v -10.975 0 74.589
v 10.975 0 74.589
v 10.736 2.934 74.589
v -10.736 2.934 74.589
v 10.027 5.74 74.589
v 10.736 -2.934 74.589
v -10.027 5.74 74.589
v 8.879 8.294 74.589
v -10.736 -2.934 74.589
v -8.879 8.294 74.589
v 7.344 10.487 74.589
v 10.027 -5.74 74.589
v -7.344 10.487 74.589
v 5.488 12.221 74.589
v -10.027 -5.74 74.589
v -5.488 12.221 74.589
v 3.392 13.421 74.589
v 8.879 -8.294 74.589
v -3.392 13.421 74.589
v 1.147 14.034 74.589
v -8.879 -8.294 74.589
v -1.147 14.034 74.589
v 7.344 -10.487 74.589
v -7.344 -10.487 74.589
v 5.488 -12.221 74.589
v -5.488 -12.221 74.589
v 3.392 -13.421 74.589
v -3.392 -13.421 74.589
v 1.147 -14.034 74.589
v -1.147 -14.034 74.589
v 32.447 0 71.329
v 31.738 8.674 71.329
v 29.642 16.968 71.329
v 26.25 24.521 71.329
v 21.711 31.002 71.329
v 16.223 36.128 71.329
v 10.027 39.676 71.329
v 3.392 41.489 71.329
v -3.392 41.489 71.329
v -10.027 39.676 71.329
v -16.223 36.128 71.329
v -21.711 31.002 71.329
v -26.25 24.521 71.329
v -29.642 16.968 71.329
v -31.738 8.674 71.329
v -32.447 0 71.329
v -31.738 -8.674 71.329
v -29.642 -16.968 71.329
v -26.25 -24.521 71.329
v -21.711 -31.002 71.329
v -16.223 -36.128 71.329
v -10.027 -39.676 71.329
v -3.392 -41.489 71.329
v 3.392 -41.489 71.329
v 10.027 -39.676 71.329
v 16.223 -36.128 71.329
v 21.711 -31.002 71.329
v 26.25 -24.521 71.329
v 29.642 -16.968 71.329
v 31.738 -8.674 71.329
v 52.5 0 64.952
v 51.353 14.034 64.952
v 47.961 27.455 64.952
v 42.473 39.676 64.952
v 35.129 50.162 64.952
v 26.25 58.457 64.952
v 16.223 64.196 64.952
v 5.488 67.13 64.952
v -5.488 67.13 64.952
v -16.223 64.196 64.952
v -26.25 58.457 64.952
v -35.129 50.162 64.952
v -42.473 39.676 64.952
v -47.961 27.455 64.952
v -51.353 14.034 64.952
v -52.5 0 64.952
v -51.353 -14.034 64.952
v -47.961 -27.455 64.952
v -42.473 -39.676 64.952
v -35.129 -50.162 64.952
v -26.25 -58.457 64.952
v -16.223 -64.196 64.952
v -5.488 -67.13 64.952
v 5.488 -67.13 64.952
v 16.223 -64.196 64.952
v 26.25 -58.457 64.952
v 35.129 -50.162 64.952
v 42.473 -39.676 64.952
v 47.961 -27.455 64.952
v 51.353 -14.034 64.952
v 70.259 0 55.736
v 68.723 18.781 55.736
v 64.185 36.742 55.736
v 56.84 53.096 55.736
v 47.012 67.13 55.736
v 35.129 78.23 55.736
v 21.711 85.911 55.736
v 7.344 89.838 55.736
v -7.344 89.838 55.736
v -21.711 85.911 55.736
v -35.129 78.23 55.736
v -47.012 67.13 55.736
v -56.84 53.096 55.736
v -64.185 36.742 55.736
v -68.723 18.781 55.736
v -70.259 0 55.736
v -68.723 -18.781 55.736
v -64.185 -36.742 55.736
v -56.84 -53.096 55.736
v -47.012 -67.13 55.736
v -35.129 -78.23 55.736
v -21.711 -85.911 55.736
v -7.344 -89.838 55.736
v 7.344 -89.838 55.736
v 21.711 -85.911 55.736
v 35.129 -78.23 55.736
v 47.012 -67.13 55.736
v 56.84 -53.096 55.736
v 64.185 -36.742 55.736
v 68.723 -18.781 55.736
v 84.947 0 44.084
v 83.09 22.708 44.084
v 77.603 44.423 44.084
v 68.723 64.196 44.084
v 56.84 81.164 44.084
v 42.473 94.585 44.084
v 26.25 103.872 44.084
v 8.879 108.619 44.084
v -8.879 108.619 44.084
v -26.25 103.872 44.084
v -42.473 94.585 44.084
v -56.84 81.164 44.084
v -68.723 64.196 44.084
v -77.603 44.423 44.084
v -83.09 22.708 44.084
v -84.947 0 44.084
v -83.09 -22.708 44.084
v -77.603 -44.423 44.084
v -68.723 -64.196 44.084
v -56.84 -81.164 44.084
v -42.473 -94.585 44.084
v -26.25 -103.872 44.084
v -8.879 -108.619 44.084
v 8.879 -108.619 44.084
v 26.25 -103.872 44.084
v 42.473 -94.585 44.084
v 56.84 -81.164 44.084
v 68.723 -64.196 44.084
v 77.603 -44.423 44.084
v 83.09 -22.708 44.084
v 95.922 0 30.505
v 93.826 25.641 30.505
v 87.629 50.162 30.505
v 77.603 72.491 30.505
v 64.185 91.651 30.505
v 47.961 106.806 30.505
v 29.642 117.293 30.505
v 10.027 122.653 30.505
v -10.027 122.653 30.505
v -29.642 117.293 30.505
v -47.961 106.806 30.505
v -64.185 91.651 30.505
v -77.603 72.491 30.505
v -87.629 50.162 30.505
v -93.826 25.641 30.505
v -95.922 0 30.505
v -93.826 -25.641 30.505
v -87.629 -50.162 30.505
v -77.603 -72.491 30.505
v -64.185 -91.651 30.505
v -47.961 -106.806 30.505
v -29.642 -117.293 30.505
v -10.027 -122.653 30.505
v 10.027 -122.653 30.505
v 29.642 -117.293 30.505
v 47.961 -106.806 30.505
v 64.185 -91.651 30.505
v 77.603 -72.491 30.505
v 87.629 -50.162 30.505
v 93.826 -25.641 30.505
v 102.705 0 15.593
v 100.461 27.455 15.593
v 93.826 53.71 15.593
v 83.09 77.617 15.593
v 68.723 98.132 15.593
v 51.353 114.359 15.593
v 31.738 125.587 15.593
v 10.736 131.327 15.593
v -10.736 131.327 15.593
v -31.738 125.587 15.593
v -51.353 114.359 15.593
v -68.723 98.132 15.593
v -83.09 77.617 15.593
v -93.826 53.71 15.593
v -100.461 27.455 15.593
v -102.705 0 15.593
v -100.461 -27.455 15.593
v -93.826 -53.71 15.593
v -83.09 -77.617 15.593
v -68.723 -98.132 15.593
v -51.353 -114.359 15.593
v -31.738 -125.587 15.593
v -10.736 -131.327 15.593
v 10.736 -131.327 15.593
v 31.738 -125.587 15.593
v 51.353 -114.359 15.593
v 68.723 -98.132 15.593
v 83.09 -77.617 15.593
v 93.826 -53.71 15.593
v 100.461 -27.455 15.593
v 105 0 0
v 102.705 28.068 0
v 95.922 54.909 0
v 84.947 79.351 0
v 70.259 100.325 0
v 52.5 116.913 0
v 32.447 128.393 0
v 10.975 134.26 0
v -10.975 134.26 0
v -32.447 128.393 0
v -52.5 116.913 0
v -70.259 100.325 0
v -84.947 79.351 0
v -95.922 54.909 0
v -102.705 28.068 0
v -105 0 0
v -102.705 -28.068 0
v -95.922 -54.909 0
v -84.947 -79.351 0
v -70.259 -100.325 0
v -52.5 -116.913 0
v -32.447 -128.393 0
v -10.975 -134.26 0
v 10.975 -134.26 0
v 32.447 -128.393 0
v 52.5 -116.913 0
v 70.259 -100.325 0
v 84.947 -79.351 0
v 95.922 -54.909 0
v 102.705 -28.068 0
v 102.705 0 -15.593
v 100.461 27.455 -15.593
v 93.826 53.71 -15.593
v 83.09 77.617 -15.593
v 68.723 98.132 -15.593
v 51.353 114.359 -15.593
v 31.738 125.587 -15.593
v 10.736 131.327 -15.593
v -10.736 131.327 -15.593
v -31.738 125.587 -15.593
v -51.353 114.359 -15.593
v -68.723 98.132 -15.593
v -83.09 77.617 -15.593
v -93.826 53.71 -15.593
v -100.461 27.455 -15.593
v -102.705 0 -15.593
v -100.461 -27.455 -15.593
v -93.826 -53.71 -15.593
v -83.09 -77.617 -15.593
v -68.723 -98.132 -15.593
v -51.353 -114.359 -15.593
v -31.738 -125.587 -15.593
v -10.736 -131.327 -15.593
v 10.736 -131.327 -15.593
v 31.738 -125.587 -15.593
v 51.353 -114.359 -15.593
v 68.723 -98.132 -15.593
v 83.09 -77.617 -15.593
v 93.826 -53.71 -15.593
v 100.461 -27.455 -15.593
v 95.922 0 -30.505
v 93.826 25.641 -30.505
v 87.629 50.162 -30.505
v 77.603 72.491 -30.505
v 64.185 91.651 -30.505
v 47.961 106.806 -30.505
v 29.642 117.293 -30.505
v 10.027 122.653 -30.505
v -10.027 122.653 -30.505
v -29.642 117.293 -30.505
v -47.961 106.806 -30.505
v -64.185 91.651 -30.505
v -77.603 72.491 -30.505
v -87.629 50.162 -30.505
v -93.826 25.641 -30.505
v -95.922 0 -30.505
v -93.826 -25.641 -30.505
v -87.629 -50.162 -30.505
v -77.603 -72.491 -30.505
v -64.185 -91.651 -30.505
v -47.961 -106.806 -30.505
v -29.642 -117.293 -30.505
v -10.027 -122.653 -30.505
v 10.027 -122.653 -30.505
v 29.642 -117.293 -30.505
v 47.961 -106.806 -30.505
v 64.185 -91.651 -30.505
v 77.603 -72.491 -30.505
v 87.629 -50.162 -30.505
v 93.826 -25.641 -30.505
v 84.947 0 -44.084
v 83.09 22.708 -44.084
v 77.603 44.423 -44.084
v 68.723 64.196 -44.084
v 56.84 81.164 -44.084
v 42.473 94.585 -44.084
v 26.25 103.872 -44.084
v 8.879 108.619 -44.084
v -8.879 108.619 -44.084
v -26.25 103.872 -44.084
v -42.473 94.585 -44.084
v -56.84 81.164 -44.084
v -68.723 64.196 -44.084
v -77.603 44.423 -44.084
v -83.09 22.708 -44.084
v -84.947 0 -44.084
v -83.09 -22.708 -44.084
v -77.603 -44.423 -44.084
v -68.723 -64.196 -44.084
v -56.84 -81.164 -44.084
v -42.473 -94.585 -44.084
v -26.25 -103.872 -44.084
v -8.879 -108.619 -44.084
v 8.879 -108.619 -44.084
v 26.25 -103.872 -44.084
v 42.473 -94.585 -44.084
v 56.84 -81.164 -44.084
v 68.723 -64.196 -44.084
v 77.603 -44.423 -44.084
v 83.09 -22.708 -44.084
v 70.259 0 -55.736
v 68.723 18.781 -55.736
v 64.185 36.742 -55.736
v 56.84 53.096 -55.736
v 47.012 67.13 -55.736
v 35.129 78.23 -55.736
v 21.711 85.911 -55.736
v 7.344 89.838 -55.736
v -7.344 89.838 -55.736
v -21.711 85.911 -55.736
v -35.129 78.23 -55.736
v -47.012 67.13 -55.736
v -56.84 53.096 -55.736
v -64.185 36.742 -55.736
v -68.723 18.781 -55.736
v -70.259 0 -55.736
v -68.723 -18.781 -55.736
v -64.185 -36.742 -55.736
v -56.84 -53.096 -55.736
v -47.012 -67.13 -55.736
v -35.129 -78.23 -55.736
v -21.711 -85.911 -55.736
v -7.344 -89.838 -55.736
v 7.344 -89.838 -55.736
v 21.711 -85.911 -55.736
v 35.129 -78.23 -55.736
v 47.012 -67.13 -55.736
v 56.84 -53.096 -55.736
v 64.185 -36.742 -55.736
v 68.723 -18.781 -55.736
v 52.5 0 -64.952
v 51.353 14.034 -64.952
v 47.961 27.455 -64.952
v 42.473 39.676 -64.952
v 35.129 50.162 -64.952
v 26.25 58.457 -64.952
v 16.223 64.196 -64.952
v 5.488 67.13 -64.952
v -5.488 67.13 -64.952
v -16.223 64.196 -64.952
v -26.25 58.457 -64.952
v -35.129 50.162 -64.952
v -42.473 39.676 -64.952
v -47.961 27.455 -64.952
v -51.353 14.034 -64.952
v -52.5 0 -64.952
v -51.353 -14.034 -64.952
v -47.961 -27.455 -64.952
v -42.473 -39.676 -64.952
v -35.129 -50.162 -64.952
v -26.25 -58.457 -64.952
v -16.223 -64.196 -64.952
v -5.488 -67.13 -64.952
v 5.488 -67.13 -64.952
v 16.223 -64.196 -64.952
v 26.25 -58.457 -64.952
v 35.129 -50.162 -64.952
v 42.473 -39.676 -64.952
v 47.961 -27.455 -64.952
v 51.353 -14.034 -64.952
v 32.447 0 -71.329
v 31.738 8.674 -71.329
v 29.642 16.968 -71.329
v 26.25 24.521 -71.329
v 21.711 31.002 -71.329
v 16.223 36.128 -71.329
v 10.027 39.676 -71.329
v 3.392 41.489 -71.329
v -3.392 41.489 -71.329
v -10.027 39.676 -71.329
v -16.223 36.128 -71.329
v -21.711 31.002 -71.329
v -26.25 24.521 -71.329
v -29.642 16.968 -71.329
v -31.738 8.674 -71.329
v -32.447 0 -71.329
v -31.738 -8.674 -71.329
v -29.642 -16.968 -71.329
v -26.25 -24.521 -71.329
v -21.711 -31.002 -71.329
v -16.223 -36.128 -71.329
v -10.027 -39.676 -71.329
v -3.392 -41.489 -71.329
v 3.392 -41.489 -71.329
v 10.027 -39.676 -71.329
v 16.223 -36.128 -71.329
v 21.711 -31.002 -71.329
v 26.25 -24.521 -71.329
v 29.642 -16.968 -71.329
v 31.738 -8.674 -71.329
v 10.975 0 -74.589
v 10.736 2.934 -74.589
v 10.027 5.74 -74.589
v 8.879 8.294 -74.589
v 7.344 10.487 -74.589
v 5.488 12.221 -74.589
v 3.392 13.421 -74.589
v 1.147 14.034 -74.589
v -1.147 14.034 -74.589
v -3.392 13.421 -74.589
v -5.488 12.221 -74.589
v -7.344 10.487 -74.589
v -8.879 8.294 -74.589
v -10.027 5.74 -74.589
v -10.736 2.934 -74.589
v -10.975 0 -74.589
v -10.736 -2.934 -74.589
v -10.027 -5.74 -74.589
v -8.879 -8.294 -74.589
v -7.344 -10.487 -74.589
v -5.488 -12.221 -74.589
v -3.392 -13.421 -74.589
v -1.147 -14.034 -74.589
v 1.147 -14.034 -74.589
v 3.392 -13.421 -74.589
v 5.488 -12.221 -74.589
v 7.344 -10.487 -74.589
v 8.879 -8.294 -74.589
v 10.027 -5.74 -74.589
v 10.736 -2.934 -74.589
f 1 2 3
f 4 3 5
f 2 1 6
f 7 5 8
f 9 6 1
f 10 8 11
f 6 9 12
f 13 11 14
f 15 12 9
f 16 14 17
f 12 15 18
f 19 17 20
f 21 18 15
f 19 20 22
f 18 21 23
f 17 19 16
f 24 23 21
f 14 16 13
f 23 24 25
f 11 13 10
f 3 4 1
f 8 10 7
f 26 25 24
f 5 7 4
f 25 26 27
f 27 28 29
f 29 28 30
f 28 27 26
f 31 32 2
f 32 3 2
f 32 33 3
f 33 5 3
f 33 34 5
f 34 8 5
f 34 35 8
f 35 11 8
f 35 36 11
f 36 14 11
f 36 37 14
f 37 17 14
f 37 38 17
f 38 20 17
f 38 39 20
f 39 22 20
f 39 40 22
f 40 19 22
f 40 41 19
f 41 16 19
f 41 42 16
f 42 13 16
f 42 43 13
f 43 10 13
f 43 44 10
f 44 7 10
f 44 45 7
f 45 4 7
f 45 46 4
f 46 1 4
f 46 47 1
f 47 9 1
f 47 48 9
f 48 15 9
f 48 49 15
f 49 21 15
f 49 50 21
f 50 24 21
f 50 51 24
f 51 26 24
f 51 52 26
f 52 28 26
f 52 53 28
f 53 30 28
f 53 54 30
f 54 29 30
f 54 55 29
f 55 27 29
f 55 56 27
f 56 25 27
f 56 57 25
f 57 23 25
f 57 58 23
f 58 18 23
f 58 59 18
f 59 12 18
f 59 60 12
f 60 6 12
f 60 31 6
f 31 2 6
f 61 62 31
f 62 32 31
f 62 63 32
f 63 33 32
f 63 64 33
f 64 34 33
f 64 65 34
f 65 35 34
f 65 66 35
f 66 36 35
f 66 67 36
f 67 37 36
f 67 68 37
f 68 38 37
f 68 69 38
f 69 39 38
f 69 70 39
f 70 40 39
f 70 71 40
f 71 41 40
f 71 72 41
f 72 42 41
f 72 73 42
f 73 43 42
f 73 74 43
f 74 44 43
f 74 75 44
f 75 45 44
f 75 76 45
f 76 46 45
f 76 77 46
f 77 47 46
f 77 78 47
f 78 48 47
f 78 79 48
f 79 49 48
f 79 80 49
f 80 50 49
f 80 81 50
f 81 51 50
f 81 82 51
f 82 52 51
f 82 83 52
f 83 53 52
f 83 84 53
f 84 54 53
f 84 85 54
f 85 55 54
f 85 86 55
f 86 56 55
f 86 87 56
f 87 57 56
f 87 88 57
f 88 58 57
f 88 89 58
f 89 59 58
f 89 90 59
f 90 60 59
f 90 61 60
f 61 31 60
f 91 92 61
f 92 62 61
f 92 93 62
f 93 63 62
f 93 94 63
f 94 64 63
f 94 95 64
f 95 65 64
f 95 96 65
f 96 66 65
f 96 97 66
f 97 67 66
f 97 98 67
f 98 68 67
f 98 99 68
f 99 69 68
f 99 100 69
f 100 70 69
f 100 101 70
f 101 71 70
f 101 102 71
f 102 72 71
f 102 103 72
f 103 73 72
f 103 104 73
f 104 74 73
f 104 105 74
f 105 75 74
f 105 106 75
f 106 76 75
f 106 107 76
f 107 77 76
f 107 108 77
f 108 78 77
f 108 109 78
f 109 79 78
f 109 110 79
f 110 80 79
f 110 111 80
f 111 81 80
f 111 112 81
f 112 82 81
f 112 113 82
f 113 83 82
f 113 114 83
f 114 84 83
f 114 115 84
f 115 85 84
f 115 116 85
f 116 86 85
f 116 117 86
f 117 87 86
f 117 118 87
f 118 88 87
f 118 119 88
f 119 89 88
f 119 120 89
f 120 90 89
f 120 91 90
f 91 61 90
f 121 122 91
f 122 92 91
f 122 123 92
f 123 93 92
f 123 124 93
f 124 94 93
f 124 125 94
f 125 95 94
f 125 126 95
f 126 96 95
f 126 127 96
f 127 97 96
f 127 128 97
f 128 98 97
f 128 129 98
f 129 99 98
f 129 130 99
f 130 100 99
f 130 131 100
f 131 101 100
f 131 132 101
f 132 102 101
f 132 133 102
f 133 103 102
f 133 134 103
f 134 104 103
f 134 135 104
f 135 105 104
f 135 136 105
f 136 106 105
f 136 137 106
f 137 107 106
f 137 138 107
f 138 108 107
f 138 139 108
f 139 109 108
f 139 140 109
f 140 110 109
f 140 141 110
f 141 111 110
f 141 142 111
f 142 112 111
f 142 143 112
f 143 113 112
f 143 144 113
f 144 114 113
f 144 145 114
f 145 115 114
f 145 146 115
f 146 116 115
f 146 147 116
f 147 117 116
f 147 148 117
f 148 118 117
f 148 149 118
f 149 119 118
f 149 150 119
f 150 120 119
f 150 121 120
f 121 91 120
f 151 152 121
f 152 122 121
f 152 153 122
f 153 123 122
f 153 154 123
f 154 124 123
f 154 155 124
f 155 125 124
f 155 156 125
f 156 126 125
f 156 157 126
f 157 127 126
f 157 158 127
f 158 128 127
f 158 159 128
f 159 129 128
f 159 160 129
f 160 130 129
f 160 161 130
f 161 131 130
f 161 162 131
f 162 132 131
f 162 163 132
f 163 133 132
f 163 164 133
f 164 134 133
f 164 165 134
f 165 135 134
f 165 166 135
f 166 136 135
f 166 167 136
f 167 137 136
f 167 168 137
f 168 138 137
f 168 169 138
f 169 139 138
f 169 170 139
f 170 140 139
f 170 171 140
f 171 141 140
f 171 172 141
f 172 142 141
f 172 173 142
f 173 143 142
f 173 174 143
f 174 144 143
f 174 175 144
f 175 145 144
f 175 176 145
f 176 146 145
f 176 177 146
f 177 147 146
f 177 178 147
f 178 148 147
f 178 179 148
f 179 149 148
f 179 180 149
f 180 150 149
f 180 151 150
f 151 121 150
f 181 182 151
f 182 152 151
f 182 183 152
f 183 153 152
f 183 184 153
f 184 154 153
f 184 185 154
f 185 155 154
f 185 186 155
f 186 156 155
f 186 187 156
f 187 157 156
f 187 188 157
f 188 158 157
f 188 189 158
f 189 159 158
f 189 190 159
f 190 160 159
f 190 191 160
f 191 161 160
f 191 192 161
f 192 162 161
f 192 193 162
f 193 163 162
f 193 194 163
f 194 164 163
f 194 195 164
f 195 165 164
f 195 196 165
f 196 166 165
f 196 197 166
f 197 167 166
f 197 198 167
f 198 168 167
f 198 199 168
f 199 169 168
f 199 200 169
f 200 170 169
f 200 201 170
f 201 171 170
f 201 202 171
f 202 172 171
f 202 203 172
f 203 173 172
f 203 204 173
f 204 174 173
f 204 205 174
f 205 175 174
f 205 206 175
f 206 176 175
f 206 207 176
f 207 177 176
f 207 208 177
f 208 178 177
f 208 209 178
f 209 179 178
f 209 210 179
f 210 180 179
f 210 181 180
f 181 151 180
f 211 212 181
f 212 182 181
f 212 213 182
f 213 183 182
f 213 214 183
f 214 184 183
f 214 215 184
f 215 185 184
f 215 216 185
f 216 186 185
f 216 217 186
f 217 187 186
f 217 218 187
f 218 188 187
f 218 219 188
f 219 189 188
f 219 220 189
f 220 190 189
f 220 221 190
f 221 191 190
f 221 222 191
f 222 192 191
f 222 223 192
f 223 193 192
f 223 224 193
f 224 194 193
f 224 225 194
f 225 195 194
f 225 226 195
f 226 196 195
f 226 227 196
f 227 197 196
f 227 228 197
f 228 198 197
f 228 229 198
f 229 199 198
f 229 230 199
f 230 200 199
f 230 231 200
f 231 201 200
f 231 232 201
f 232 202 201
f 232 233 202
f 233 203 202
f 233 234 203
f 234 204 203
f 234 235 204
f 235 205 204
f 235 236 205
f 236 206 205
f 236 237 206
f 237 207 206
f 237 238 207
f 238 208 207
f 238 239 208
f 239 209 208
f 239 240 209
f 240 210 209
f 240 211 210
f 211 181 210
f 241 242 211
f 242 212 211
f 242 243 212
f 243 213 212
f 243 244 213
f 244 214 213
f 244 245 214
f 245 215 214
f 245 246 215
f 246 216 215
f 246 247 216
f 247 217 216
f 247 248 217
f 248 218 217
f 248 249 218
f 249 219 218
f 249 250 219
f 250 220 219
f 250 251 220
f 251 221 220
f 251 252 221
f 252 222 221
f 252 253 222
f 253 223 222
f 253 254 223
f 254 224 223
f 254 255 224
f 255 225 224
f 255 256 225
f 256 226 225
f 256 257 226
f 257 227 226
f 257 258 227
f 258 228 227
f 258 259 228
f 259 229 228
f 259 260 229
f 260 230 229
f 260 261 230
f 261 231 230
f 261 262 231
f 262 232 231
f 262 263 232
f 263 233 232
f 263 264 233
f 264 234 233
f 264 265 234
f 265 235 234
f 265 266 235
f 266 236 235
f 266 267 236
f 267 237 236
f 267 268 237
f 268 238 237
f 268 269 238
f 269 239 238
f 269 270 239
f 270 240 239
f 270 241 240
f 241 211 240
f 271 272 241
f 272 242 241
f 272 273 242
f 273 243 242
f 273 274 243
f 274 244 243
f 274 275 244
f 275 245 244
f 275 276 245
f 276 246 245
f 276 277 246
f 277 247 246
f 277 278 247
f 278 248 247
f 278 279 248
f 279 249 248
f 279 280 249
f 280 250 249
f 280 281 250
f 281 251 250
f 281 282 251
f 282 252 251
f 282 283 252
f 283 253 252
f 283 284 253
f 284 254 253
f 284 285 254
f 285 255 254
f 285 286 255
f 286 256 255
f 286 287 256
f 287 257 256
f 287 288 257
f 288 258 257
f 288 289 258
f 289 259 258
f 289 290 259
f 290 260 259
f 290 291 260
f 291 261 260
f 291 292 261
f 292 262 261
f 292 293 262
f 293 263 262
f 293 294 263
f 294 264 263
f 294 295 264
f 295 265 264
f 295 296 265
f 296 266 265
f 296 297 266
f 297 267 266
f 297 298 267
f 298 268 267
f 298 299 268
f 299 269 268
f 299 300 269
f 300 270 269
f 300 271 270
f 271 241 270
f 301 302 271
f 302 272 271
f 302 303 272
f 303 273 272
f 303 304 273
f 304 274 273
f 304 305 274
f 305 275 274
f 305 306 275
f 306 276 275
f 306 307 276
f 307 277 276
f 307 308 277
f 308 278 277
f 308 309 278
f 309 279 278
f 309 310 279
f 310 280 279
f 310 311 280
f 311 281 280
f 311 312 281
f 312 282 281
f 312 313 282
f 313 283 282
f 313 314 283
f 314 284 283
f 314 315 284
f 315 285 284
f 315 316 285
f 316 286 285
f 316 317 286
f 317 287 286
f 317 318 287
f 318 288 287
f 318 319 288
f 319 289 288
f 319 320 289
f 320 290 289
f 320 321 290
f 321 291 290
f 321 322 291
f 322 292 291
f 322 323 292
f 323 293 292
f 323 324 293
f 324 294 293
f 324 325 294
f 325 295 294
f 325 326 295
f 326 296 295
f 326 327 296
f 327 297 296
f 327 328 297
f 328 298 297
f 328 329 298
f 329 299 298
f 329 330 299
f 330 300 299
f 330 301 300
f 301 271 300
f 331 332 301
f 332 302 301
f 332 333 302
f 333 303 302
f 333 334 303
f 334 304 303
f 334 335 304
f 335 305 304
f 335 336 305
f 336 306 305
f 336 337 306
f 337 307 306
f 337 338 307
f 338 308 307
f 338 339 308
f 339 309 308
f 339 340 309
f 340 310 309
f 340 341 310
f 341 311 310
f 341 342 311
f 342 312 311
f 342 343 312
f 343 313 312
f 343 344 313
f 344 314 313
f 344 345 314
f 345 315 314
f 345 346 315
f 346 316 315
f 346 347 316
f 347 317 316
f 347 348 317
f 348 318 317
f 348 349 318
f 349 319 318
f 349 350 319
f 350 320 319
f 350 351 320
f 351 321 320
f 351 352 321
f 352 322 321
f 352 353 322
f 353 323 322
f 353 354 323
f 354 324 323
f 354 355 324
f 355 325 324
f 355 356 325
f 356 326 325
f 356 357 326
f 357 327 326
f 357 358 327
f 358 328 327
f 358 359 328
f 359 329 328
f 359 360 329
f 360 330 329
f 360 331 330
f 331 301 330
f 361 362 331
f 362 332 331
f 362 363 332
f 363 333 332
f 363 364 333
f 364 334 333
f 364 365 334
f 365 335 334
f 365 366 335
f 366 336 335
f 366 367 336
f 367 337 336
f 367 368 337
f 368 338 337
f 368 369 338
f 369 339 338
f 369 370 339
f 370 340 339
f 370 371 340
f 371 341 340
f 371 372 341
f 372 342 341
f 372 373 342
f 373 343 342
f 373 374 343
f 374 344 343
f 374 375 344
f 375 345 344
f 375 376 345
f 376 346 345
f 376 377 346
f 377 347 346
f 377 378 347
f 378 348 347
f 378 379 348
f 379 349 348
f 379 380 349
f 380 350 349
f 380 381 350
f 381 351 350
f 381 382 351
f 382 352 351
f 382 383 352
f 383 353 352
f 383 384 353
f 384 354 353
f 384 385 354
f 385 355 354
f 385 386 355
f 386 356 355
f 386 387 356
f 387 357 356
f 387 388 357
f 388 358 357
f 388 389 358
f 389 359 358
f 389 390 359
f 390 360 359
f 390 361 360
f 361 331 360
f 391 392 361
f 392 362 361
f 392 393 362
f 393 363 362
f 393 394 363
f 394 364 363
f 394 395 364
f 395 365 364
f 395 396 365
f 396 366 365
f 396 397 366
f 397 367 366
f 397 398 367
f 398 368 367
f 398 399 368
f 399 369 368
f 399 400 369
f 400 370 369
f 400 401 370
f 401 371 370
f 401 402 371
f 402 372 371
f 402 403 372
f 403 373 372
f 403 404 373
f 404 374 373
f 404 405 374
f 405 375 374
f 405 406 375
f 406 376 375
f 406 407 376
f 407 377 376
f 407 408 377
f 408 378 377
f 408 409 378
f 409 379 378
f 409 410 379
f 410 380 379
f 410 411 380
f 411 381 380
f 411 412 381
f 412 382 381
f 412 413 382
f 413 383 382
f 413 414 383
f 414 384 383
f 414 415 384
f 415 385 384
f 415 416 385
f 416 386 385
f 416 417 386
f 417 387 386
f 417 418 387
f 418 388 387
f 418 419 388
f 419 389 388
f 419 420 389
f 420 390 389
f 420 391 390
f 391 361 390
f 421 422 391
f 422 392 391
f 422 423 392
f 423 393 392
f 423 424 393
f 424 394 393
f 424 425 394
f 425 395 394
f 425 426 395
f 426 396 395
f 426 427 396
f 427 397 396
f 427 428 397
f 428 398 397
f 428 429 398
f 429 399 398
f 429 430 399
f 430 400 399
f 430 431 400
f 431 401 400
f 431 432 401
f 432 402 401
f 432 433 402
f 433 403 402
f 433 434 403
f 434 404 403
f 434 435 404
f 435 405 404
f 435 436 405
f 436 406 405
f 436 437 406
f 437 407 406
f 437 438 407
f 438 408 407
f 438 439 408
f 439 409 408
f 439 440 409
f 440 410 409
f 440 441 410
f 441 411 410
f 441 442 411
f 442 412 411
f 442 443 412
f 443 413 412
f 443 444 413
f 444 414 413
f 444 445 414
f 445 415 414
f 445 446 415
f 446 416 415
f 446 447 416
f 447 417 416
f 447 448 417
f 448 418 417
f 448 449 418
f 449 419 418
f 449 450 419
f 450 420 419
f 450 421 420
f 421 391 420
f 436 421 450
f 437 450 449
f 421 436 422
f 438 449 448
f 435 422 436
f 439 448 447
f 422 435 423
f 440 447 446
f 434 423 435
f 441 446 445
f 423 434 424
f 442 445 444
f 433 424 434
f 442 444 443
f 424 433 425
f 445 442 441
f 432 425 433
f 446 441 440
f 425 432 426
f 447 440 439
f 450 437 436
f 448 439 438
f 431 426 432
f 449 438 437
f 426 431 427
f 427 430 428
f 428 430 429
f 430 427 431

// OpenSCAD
// Generated by SolidPython 1.0.1 on 2020-07-29 00:46:47


scale(v = [7, 9, 5]) {
	sphere(r = 15);
}
/***********************************************
*********      SolidPython code:      **********
************************************************
 
# import packages: SolidPython
from solid import *
from solid.utils import *
from itertools import chain, combinations, permutations


class Resize:

    def __init__(self, scad_file):
        self.scad_file = scad_file
        #self.scad_file = import_scad(scad_file)
        # cone/cylinder param:
        self.r1 = 0
        self.r2 = 0
        self.h = 0
        # rectangular prism param:
        self.w = 0
        self.l = 0
        # ellipse param:
        self.r = 0

    # import OpenScad code (file name corresponds to shape)


    # classify shape + parameters
    def assign(self, param1, param2, param3):
        if self.scad_file == 'cone.scad':
            self.r1 = param1
            self.r2 = param2
            self.h = param3
        elif self.scad_file == 'cylinder.scad':
            self.r1 = param1
            self.r2 = param2
            self.h = param3
        elif self.scad_file == 'rectangularPrism.scad':
            self.h = param1
            self.l = param2
            self.w = param3
        else:
            self.r = param1
            self.h = param2

    # resize parameters
    def iterate(self):
        x = range(3, 20, 2)
        i = 1
        if self.scad_file == 'cone.scad':
            tempList = list(permutations(x, 2))
            for temp in tempList:
                param1 = temp[0]
                param2 = temp[1]
                filepath = 'produced_scad_files/' + 'cone' + str(param1) + '_' + str(param2) + '_' + '.scad'
                scad_render_to_file(cylinder(h=param1, r1=param2, r2=0), filepath)

        elif self.scad_file == 'cylinder.scad':
            tempList = list(permutations(x, 3))
            for temp in tempList:
                param1 = temp[0]
                param2 = temp[1]
                filepath = 'produced_scad_files/' + 'cylinder' + str(param1) + '_' + str(param2) + '_' + '.scad'
                scad_render_to_file(cylinder(h=param1, r1=param2, r2=param2), filepath)

        elif self.scad_file == 'rectangularPrism.scad':
            tempList = list(permutations(x, 3))
            for temp in tempList:
                param1 = temp[0]
                param2 = temp[1]
                param3 = temp[2]
                filepath = 'produced_scad_files/' + 'rectangularPrism' + str(param1) + '_' + str(param2) + '_' + str(
                    param3) + '.scad'
                scad_render_to_file(cube(size=(param1, param2, param3)), filepath)

        elif self.scad_file == 'ellipse.scad':
            tempList = list(permutations(x, 4))
            for temp in tempList:
                param1 = temp[0]
                param2 = temp[1]
                param3 = temp[2]
                param4 = temp[3]
                filepath = 'produced_scad_files/' + 'ellipse' + str(param1) + '_' + str(param2) + '_' + str(param3) + '_' + str(param4) + '.scad'
                scad_render_to_file(scale([param1, param2, param3])(sphere(r=param4)), filepath)

    def render_to_scadfile(self):
        scad_render_to_file(scad, 'example.scad') 
 
************************************************/
